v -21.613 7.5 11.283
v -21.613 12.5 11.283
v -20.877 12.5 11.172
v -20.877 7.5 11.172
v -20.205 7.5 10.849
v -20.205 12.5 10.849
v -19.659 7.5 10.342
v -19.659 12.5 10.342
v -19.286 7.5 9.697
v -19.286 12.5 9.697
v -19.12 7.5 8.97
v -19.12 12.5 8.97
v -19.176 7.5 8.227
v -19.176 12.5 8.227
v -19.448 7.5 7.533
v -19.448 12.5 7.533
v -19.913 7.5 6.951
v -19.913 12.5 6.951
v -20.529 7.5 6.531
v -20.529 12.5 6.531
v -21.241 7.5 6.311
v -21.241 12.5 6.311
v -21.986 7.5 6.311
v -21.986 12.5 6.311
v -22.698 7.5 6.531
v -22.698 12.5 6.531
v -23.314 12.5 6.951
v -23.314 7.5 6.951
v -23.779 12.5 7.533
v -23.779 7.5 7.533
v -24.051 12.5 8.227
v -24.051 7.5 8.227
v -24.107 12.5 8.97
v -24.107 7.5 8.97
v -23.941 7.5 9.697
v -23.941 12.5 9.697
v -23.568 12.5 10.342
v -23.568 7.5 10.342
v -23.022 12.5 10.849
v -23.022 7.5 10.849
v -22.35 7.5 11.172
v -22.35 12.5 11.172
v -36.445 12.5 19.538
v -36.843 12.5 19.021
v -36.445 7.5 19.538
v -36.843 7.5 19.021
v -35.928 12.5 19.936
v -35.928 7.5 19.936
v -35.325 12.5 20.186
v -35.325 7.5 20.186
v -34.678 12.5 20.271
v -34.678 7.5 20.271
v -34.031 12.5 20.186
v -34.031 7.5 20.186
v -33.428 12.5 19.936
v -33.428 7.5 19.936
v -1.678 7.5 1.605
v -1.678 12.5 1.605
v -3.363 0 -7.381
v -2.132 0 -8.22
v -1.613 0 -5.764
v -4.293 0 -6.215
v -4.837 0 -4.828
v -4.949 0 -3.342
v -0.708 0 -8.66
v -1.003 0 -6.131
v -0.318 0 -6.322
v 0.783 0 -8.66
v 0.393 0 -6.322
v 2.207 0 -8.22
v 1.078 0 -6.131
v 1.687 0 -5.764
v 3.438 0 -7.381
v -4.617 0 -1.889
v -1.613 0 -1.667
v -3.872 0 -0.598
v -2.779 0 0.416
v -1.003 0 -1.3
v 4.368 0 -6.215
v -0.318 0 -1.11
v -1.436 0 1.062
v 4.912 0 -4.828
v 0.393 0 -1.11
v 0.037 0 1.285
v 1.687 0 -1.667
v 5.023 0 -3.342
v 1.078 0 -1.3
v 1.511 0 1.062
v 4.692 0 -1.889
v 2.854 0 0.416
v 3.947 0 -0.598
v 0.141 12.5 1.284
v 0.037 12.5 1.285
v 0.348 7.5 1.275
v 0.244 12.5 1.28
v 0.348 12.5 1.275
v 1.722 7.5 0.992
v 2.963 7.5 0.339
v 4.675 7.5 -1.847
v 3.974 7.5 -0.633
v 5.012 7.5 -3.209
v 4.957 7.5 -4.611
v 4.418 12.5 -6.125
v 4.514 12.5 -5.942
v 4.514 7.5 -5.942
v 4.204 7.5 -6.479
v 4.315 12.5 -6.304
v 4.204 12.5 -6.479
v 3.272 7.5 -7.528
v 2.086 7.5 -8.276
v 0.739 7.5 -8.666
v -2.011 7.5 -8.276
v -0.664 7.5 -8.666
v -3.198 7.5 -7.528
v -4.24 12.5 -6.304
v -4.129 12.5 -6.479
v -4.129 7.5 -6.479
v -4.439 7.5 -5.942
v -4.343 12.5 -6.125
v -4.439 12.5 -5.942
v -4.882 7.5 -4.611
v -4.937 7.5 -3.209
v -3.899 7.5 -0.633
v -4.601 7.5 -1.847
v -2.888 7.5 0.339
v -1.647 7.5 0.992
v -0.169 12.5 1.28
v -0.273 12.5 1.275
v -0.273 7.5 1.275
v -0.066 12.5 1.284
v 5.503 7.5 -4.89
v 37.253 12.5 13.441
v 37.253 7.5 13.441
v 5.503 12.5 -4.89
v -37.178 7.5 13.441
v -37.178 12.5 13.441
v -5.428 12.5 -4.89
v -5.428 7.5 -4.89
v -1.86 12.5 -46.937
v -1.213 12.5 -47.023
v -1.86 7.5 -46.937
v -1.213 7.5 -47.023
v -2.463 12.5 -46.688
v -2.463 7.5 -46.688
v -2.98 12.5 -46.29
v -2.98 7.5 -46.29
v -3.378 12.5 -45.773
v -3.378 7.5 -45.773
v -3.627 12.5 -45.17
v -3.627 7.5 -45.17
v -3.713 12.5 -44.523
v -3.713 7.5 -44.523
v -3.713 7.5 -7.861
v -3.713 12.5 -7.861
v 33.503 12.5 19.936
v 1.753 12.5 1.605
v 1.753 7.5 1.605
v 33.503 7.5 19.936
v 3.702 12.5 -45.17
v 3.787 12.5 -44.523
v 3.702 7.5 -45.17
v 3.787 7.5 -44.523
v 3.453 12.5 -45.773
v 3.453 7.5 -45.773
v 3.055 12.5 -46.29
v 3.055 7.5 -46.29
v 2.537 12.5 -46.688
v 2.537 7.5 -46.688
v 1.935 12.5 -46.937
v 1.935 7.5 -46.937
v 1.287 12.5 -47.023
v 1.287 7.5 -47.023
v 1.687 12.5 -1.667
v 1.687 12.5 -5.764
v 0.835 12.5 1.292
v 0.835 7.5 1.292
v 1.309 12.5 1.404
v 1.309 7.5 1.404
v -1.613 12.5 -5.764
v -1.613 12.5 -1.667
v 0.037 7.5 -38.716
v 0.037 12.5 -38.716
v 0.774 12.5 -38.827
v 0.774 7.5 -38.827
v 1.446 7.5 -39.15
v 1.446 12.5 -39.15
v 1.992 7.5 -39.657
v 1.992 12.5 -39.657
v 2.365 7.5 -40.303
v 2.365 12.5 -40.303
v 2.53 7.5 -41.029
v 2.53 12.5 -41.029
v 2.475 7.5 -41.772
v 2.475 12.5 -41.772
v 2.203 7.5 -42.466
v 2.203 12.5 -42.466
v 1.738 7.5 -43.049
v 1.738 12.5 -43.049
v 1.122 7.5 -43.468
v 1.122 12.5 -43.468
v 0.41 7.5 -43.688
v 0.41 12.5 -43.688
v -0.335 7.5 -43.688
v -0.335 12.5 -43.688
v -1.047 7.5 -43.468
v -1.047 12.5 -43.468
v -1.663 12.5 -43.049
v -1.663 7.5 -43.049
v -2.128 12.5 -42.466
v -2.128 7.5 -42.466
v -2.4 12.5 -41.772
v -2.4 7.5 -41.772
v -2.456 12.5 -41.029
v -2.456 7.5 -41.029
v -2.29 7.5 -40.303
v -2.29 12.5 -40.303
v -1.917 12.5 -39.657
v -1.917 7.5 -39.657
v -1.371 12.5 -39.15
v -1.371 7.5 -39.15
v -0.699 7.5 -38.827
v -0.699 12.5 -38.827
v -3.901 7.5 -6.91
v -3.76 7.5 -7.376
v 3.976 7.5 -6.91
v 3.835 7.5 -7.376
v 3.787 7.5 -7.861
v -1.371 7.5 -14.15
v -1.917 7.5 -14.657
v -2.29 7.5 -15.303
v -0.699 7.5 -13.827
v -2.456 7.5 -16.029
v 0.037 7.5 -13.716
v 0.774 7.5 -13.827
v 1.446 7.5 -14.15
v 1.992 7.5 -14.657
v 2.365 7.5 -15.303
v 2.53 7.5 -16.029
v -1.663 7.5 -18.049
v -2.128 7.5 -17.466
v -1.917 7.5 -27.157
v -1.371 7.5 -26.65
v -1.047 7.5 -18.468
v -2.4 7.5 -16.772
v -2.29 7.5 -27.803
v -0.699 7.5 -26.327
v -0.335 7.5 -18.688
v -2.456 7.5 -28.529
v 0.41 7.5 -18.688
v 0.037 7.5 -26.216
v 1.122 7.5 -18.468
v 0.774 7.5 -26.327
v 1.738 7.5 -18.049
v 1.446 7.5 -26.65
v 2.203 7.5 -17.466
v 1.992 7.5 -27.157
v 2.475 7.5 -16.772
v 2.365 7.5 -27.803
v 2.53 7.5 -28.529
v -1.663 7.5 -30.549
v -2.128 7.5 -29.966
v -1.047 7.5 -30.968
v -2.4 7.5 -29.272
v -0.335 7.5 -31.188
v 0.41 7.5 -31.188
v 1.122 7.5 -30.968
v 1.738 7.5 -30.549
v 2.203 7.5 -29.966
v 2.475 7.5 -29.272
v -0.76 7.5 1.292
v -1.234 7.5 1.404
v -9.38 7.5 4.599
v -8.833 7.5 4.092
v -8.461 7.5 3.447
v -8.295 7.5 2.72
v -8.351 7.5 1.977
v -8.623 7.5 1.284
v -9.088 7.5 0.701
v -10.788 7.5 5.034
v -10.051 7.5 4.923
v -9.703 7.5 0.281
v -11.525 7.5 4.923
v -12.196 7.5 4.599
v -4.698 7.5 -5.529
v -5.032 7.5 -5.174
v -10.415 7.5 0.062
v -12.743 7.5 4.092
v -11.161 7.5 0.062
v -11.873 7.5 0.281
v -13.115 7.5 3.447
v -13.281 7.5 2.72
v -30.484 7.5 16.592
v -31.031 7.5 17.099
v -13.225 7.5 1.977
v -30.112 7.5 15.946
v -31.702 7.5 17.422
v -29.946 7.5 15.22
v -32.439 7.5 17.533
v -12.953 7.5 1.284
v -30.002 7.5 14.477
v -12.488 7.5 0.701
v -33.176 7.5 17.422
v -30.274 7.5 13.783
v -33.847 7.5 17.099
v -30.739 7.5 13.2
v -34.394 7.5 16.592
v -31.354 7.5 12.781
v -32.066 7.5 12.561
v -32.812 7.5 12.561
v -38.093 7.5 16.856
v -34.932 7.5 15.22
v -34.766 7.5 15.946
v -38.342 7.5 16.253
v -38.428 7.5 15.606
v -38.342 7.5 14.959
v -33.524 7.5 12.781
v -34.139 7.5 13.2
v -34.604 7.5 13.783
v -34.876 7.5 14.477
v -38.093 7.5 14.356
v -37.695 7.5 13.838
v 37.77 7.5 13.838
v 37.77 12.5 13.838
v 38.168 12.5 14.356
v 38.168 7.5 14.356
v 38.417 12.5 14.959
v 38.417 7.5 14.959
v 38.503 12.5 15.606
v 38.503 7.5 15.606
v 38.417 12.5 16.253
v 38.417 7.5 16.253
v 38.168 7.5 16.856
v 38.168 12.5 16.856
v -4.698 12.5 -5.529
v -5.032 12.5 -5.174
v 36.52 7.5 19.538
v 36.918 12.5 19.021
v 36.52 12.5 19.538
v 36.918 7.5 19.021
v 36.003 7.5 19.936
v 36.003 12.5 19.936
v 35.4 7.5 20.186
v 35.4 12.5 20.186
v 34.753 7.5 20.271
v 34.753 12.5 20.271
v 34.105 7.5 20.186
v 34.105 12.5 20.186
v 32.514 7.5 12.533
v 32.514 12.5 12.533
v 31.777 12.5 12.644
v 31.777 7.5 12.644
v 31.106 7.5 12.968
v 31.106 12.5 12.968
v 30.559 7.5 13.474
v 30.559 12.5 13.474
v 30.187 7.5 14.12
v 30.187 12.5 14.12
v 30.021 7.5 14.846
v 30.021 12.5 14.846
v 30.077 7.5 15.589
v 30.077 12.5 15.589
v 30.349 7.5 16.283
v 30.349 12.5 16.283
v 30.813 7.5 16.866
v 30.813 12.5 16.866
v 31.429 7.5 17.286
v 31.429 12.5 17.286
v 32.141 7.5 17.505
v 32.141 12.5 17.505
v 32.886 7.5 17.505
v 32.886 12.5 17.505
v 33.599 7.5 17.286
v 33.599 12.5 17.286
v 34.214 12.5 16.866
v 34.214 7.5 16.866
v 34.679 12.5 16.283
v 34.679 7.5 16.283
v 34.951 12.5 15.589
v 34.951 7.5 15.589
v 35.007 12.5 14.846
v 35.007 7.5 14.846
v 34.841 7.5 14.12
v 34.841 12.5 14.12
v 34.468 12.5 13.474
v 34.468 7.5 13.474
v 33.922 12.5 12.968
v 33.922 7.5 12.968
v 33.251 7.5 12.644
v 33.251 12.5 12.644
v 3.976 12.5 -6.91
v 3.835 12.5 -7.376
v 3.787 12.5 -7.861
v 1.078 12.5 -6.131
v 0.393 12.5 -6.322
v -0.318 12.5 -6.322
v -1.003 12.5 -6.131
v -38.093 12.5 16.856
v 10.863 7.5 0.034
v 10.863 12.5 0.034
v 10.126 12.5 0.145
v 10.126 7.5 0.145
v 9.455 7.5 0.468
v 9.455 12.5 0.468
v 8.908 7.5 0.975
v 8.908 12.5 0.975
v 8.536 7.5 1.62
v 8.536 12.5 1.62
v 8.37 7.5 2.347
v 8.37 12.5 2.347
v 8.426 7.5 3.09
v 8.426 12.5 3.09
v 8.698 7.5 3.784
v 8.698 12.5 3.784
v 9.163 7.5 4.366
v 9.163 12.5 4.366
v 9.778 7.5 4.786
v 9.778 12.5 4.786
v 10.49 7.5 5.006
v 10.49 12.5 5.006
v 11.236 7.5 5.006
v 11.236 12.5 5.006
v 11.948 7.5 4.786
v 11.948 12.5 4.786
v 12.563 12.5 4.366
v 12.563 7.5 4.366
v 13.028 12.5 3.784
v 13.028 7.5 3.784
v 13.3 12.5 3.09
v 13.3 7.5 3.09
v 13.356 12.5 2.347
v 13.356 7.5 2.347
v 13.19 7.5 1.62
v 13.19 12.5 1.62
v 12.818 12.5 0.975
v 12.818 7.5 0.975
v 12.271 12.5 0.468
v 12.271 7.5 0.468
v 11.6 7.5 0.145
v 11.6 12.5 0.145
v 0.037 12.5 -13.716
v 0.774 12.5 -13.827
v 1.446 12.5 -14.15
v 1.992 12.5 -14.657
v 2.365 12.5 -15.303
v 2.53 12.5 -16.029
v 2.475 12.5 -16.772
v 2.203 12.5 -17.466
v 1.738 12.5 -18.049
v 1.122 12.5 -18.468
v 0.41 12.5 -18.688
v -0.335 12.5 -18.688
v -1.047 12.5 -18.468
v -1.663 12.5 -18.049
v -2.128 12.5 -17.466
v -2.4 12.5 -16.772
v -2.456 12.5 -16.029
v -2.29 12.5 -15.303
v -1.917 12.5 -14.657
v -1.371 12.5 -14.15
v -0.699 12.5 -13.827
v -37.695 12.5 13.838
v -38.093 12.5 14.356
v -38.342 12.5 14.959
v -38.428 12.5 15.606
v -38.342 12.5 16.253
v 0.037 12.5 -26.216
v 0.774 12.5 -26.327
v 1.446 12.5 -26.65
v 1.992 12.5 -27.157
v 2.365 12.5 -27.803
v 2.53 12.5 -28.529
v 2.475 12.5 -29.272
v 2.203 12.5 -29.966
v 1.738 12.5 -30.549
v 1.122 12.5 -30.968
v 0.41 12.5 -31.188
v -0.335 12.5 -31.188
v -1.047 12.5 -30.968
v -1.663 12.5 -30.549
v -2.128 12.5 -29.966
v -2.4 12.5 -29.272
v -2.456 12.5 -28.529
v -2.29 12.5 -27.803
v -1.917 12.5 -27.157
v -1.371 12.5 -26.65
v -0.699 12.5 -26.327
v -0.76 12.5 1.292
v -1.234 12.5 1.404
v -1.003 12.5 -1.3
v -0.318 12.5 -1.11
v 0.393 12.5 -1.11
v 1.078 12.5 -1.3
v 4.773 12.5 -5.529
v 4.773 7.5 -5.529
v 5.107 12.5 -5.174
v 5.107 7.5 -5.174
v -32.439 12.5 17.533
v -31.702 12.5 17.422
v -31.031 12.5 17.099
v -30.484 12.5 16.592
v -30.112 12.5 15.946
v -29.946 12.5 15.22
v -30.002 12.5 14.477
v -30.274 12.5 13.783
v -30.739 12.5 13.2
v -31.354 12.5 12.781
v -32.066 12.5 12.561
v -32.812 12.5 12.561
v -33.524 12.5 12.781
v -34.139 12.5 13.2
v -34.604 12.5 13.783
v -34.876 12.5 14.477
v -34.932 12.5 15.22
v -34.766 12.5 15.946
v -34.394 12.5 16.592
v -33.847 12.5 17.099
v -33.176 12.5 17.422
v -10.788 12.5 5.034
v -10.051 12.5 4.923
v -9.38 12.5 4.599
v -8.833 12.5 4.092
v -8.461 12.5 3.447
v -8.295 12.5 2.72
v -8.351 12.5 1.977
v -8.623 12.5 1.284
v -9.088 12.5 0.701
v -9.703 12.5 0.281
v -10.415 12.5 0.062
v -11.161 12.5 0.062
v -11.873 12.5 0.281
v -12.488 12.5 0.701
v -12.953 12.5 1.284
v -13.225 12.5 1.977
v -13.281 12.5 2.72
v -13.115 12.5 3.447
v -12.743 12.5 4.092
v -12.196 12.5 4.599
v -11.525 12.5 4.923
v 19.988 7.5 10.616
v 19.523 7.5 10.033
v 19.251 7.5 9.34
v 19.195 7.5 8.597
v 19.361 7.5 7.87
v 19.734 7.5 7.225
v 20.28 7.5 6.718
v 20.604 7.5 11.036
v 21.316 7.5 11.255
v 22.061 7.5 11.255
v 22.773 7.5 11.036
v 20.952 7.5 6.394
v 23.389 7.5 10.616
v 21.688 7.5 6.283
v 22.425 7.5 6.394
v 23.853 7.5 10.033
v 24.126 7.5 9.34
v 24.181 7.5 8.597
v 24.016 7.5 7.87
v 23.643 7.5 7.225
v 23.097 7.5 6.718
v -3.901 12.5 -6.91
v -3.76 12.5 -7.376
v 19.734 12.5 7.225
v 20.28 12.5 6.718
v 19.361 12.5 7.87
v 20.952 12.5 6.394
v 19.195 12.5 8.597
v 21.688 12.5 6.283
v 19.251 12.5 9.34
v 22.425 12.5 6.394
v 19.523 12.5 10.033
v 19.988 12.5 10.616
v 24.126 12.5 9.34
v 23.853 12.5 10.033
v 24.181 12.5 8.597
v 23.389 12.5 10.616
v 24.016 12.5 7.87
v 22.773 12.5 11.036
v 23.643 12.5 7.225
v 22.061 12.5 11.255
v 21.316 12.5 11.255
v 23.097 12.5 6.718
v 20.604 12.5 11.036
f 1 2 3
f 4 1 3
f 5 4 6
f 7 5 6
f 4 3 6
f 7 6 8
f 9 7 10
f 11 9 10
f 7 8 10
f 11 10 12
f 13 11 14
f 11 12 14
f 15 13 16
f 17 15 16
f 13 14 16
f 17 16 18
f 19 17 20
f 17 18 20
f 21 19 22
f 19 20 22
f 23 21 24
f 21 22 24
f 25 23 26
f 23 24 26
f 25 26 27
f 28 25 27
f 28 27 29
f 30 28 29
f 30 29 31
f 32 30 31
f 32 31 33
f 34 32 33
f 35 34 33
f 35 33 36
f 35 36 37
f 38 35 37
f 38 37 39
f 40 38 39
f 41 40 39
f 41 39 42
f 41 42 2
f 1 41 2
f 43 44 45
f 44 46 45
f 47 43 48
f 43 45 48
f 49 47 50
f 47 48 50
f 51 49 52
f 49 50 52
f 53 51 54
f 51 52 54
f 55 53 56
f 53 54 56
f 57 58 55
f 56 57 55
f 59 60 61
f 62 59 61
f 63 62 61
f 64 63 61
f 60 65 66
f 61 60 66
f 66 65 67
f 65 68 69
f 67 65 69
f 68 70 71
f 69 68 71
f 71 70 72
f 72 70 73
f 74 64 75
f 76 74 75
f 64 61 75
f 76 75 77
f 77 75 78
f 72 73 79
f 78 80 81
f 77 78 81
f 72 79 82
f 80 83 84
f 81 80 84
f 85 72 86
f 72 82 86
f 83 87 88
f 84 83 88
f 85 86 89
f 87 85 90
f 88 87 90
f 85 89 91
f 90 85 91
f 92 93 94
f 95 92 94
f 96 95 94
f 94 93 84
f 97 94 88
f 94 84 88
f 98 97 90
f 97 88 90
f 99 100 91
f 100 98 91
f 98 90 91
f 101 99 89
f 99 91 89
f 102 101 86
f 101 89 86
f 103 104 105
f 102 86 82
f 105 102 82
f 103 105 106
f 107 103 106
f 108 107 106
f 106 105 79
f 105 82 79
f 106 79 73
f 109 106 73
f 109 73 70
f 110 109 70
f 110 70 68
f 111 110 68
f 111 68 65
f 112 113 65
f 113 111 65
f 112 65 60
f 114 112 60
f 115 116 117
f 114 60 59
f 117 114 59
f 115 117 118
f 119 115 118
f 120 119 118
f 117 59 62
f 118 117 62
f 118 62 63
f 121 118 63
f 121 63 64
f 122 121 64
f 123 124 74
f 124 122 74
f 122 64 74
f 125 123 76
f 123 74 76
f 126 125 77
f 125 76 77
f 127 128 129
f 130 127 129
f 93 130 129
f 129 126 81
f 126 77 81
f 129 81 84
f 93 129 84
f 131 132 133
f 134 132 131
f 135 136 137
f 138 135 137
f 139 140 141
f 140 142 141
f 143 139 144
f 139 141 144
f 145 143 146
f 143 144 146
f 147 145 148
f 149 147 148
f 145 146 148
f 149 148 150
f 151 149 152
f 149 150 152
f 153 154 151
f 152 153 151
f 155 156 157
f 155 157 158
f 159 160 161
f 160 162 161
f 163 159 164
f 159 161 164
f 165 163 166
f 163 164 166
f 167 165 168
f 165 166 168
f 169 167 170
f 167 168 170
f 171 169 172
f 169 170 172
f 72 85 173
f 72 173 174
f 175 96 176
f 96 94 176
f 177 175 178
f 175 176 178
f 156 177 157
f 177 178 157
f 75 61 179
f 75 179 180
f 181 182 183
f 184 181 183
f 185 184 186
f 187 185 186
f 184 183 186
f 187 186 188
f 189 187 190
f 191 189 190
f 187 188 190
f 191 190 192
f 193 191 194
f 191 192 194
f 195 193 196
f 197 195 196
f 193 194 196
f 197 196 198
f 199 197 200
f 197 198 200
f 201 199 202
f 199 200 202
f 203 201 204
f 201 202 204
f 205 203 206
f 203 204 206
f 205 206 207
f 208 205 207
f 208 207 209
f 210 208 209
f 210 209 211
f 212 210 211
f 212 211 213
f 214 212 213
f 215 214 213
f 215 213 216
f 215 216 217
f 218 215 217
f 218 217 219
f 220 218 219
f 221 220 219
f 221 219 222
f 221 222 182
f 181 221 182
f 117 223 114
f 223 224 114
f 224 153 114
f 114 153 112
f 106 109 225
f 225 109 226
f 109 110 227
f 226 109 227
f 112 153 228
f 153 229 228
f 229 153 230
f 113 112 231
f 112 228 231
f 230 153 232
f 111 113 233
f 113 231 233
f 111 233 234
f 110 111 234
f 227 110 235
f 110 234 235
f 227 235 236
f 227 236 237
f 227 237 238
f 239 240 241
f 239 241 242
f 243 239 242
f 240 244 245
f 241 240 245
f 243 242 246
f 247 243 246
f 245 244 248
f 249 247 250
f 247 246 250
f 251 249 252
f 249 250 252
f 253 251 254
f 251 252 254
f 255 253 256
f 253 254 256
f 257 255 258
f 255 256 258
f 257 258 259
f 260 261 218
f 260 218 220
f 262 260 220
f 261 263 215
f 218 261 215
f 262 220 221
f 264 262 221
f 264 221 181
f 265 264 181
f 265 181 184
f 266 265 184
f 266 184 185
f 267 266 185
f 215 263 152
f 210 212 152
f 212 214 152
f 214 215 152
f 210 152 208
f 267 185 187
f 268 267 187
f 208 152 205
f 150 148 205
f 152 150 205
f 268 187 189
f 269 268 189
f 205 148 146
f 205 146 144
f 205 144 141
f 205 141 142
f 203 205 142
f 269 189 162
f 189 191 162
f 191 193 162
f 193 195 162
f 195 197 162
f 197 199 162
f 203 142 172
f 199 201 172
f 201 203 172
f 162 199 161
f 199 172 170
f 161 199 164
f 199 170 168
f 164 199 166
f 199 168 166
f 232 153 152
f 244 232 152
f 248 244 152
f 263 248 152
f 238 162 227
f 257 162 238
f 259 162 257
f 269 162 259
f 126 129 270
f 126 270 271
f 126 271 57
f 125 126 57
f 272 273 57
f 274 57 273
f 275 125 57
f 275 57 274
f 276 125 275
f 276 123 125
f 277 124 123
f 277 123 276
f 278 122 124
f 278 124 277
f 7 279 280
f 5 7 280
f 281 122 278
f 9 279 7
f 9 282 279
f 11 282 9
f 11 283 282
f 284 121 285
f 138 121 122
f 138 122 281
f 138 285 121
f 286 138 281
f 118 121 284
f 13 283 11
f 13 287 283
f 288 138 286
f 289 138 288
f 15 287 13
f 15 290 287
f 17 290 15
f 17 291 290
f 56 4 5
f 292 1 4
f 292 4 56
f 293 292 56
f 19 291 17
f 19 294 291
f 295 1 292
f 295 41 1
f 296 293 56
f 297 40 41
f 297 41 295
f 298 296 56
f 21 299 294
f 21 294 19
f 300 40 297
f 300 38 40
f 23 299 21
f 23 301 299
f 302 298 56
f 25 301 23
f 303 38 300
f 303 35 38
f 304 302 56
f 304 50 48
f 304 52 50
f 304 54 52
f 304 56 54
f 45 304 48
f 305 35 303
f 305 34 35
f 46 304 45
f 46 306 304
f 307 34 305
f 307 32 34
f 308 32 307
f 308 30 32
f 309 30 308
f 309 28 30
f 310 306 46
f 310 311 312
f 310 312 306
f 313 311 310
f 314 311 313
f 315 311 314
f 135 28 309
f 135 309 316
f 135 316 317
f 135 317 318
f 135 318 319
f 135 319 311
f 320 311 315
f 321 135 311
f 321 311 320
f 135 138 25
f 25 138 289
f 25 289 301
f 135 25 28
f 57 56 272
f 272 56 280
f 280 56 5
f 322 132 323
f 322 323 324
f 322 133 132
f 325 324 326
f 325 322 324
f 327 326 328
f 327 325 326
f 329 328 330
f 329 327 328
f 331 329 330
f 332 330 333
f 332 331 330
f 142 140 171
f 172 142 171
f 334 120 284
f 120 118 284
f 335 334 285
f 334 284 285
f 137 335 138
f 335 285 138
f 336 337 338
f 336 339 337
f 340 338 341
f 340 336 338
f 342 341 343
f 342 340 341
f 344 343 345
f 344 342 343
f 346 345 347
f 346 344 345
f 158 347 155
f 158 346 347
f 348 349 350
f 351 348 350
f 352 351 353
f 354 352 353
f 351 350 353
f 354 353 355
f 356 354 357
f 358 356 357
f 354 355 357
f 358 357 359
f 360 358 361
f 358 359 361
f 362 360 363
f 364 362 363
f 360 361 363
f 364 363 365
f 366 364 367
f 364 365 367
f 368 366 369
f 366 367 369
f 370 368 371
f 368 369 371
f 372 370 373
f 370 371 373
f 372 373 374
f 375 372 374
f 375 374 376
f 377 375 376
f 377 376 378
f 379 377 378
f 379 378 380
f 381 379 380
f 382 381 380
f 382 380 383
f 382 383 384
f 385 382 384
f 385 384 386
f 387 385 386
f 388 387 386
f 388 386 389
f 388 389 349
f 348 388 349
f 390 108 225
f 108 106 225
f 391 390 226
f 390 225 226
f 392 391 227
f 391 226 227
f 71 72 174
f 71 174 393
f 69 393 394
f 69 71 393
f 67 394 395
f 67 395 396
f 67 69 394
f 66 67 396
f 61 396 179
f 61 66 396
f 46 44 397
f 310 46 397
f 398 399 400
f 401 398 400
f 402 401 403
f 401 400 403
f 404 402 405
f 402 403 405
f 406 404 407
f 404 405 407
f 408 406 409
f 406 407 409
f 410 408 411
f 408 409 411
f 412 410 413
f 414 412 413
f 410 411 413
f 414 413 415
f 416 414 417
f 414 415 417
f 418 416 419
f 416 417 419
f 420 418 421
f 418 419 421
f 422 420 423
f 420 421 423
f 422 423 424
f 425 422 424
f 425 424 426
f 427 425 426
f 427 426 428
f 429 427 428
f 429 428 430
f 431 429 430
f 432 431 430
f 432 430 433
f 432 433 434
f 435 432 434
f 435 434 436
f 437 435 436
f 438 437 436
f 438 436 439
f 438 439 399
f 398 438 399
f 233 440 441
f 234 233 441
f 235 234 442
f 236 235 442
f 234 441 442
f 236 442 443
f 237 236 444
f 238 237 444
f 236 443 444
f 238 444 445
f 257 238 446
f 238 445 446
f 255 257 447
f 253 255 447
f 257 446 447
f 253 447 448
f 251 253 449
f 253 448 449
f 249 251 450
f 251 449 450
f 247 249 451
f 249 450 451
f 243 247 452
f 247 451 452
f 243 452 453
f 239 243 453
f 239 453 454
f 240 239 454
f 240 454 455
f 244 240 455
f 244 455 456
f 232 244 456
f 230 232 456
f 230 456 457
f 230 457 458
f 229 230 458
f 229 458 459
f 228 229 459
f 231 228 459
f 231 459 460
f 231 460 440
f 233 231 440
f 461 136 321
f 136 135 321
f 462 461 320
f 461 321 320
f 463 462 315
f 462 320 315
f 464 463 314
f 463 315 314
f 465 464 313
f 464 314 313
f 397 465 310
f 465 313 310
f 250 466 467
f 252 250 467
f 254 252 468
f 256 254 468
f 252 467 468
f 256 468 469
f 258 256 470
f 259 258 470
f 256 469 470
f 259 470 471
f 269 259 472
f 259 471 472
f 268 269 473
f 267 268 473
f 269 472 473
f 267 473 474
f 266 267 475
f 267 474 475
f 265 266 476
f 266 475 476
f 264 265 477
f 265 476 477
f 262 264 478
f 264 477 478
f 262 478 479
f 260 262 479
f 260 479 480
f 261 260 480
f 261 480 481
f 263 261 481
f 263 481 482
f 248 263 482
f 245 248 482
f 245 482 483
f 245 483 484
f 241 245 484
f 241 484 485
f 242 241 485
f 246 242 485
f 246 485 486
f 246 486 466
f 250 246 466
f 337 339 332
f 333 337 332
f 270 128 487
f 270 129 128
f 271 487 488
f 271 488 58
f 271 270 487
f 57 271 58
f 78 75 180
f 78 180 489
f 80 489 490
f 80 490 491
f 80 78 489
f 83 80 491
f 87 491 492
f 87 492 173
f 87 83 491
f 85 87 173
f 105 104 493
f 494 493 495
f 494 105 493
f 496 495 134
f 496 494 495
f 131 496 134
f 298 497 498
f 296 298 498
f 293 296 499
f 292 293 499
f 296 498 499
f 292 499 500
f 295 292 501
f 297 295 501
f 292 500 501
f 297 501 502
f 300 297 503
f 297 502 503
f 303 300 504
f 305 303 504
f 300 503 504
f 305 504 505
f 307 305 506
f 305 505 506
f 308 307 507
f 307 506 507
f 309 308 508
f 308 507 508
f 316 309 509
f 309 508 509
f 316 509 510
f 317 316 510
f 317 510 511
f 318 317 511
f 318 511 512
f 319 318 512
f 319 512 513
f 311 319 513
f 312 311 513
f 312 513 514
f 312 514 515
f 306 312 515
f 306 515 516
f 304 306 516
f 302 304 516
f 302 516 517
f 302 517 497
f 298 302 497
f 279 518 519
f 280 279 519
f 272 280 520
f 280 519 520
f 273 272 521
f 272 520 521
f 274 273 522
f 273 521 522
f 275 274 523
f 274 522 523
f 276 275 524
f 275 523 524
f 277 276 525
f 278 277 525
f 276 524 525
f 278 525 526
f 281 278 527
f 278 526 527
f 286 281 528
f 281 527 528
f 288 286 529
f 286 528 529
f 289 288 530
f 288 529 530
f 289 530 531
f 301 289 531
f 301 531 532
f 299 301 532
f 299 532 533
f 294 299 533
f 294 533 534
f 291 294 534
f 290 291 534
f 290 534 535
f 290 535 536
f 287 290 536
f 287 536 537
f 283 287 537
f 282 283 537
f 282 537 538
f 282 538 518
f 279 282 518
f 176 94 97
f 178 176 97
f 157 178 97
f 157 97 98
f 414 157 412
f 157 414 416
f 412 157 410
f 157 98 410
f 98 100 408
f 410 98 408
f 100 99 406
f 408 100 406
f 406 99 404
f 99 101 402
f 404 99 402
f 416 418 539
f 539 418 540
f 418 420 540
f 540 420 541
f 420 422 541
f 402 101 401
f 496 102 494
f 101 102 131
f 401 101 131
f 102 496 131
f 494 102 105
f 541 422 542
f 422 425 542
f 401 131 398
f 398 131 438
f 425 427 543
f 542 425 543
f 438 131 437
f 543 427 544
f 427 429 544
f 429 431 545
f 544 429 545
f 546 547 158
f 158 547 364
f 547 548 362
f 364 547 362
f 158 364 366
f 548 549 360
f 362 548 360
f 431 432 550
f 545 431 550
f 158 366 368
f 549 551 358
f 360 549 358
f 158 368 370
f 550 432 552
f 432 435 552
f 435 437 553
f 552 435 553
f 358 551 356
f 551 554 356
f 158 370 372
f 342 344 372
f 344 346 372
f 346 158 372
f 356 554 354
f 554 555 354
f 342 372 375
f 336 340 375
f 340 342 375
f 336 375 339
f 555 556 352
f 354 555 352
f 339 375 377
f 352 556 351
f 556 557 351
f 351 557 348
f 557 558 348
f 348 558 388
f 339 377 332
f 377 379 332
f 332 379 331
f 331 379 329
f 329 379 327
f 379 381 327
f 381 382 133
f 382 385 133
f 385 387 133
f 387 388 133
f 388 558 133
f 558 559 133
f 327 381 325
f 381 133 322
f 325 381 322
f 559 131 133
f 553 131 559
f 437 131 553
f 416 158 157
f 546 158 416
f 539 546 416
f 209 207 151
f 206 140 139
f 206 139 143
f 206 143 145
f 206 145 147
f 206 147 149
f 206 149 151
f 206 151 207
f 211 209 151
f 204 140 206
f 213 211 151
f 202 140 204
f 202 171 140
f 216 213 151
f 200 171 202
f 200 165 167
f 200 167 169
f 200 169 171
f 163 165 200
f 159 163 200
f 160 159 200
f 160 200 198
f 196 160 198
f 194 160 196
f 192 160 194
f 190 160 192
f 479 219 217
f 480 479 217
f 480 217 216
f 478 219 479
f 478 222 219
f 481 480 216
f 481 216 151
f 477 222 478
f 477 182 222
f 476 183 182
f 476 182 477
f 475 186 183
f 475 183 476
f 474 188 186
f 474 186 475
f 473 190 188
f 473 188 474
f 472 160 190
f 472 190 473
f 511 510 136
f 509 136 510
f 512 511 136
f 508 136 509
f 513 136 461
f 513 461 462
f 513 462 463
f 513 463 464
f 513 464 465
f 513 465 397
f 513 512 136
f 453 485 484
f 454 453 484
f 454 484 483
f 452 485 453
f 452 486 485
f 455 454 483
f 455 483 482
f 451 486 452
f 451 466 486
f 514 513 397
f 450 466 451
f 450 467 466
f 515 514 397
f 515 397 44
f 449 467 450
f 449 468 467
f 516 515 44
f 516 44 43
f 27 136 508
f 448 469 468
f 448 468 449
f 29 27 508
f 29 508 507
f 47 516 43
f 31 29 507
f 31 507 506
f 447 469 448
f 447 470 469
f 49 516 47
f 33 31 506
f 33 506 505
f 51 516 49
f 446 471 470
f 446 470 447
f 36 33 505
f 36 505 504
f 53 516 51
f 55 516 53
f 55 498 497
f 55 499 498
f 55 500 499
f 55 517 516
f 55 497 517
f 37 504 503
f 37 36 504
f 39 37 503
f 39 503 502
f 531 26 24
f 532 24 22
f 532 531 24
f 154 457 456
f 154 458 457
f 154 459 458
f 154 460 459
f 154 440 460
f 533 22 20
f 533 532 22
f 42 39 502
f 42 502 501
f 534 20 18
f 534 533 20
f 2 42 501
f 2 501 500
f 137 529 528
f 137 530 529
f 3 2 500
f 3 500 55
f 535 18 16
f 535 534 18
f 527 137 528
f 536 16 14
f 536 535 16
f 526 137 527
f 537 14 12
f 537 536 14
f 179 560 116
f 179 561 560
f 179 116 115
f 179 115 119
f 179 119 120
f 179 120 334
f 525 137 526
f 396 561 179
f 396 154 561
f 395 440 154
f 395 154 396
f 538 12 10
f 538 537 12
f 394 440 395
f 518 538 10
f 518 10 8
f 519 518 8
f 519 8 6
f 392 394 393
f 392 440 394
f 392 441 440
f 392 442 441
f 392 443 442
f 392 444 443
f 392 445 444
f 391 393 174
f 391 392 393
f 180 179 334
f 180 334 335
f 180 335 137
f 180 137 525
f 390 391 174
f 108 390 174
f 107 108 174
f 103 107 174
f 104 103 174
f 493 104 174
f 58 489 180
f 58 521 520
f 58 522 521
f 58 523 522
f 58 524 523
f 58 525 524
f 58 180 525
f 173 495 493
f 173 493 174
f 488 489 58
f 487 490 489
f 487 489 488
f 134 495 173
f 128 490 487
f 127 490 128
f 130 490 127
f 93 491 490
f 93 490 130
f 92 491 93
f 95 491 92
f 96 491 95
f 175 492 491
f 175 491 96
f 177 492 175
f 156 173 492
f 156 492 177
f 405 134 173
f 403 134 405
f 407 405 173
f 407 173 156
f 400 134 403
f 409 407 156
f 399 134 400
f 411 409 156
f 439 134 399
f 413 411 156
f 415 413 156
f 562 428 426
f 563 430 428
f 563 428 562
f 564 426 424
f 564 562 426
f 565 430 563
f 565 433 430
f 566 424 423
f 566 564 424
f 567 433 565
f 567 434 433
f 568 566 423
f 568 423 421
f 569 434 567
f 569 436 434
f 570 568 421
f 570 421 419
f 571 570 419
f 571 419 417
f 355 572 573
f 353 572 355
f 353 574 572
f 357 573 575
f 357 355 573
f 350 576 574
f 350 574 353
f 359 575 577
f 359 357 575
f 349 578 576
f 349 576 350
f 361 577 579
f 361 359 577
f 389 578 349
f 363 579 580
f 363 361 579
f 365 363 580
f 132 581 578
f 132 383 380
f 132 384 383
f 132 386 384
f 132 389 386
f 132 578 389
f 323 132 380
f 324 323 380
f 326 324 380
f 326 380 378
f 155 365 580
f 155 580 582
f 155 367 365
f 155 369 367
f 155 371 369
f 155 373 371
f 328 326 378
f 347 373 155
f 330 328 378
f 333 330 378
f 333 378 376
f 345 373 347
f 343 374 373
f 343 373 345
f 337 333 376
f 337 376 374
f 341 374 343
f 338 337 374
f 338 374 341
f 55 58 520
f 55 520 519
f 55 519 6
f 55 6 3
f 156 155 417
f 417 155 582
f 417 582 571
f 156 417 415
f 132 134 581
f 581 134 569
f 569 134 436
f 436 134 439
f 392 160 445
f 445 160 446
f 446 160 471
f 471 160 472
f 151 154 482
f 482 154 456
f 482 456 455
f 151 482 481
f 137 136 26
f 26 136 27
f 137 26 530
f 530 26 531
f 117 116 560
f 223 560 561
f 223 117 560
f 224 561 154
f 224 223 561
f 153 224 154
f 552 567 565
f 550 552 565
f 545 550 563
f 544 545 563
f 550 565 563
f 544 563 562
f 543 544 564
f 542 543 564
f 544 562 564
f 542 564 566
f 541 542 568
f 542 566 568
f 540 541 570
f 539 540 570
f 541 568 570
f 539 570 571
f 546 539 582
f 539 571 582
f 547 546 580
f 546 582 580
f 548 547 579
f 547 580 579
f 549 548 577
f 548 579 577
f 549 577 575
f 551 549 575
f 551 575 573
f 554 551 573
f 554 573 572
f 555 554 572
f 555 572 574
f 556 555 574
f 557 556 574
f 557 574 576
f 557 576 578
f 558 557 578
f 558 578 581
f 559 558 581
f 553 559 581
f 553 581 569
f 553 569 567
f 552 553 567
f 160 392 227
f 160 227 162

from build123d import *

# Parameters (mm, degrees)
SKETCH1_R           = 5
BOSS_EXTRUDE1_DEPTH = 12.5
SKETCH2_W           = 7.5
SKETCH2_H           = 40
BOSS_EXTRUDE4_DEPTH = 5
SKETCH4_R           = 2.5
CUT_EXTRUDE1_DEPTH  = 100
FILLET1_R           = 2.5
FILLET2_R           = 2.5


with BuildPart() as part:
    # Sketch1 → Boss-Extrude1 (new body)
    with BuildSketch(Plane(origin=(0, 0, 0), x_dir=(1, 0, 0), z_dir=(0, 1, 0))):
        with Locations(Location((0.037460471, 3.715413796, 0), (0, 0, 270))):
            Circle(SKETCH1_R)
        with BuildLine():
            ThreePointArc((-1.612539529, 1.667390359), (0.037460471, 1.085413796), (1.687460471, 1.667390359))
            Line((1.687460471, 1.667390359), (1.687460471, 5.76407365))
            ThreePointArc((1.687460471, 5.76407365), (0.037460471, 6.346050212), (-1.612539529, 5.76407365))
            Line((-1.612539529, 5.76407365), (-1.612539529, 1.667390359))
        make_face(mode=Mode.SUBTRACT)
    extrude(amount=BOSS_EXTRUDE1_DEPTH)

    # Sketch2 → Boss-Extrude4 (add)
    with BuildSketch(Plane(origin=(0, 12.5, 0), x_dir=(1, 0, 0), z_dir=(0, 1, 0))):
        Polygon((4.77657028, 5.309414491), (1.02657028, -1.185776038), (35.667586431, -21.185776038), (39.417586431, -14.690585509), align=None)
        with Locations((0.037460471, 27.022602935)):
            Rectangle(SKETCH2_W, SKETCH2_H)
        Polygon((-4.701649339, 5.309414491), (-0.951649339, -1.185776038), (-35.59266549, -21.185776038), (-39.34266549, -14.690585509), align=None)
    extrude(amount=-BOSS_EXTRUDE4_DEPTH)

    # Sketch4 → Cut-Extrude1 (cut)
    with BuildSketch(Plane(origin=(0, 12.5, 0), x_dir=(1, 0, 0), z_dir=(0, 1, 0))):
        with Locations(Location((0.037460471, 16.216050212, 0), (0, 0, 270))):
            Circle(SKETCH4_R)
        with Locations(Location((0.037460471, 28.716050212, 0), (0, 0, 270))):
            Circle(SKETCH4_R)
        with Locations(Location((0.037460471, 41.216050212, 0), (0, 0, 270))):
            Circle(SKETCH4_R)
        with Locations(Location((-10.788016154, -2.533674249, 0), (0, 0, 270))):
            Circle(SKETCH4_R)
        with Locations(Location((-21.613492779, -8.78339871, 0), (0, 0, 270))):
            Circle(SKETCH4_R)
        with Locations(Location((-32.438969404, -15.033123172, 0), (0, 0, 270))):
            Circle(SKETCH4_R)
        with Locations(Location((10.862937095, -2.533674249, 0), (0, 0, 90))):
            Circle(SKETCH4_R)
        with Locations(Location((21.68841372, -8.78339871, 0), (0, 0, 90))):
            Circle(SKETCH4_R)
        with Locations(Location((32.513890345, -15.033123172, 0), (0, 0, 90))):
            Circle(SKETCH4_R)
    extrude(amount=-CUT_EXTRUDE1_DEPTH, mode=Mode.SUBTRACT)

    # Fillet1
    fillet1_edges = [part.edges().sort_by_distance(p)[0] for p in [
        (4.77657028, 10, -5.309414491),
        (1.02657028, 10, 1.185776038),
        (-3.712539529, 10, -7.022602935),
        (3.787460471, 10, -7.022602935),
        (-4.701649339, 10, -5.309414491),
        (-0.951649339, 10, 1.185776038),
    ]]
    fillet(fillet1_edges, radius=FILLET1_R)

    # Fillet2
    fillet2_edges = [part.edges().sort_by_distance(p)[0] for p in [
        (39.417586431, 10, 14.690585509),
        (35.667586431, 10, 21.185776038),
        (-3.712539529, 10, -47.022602935),
        (3.787460471, 10, -47.022602935),
        (-39.34266549, 10, 14.690585509),
        (-35.59266549, 10, 21.185776038),
    ]]
    fillet(fillet2_edges, radius=FILLET2_R)


solid = part.part
